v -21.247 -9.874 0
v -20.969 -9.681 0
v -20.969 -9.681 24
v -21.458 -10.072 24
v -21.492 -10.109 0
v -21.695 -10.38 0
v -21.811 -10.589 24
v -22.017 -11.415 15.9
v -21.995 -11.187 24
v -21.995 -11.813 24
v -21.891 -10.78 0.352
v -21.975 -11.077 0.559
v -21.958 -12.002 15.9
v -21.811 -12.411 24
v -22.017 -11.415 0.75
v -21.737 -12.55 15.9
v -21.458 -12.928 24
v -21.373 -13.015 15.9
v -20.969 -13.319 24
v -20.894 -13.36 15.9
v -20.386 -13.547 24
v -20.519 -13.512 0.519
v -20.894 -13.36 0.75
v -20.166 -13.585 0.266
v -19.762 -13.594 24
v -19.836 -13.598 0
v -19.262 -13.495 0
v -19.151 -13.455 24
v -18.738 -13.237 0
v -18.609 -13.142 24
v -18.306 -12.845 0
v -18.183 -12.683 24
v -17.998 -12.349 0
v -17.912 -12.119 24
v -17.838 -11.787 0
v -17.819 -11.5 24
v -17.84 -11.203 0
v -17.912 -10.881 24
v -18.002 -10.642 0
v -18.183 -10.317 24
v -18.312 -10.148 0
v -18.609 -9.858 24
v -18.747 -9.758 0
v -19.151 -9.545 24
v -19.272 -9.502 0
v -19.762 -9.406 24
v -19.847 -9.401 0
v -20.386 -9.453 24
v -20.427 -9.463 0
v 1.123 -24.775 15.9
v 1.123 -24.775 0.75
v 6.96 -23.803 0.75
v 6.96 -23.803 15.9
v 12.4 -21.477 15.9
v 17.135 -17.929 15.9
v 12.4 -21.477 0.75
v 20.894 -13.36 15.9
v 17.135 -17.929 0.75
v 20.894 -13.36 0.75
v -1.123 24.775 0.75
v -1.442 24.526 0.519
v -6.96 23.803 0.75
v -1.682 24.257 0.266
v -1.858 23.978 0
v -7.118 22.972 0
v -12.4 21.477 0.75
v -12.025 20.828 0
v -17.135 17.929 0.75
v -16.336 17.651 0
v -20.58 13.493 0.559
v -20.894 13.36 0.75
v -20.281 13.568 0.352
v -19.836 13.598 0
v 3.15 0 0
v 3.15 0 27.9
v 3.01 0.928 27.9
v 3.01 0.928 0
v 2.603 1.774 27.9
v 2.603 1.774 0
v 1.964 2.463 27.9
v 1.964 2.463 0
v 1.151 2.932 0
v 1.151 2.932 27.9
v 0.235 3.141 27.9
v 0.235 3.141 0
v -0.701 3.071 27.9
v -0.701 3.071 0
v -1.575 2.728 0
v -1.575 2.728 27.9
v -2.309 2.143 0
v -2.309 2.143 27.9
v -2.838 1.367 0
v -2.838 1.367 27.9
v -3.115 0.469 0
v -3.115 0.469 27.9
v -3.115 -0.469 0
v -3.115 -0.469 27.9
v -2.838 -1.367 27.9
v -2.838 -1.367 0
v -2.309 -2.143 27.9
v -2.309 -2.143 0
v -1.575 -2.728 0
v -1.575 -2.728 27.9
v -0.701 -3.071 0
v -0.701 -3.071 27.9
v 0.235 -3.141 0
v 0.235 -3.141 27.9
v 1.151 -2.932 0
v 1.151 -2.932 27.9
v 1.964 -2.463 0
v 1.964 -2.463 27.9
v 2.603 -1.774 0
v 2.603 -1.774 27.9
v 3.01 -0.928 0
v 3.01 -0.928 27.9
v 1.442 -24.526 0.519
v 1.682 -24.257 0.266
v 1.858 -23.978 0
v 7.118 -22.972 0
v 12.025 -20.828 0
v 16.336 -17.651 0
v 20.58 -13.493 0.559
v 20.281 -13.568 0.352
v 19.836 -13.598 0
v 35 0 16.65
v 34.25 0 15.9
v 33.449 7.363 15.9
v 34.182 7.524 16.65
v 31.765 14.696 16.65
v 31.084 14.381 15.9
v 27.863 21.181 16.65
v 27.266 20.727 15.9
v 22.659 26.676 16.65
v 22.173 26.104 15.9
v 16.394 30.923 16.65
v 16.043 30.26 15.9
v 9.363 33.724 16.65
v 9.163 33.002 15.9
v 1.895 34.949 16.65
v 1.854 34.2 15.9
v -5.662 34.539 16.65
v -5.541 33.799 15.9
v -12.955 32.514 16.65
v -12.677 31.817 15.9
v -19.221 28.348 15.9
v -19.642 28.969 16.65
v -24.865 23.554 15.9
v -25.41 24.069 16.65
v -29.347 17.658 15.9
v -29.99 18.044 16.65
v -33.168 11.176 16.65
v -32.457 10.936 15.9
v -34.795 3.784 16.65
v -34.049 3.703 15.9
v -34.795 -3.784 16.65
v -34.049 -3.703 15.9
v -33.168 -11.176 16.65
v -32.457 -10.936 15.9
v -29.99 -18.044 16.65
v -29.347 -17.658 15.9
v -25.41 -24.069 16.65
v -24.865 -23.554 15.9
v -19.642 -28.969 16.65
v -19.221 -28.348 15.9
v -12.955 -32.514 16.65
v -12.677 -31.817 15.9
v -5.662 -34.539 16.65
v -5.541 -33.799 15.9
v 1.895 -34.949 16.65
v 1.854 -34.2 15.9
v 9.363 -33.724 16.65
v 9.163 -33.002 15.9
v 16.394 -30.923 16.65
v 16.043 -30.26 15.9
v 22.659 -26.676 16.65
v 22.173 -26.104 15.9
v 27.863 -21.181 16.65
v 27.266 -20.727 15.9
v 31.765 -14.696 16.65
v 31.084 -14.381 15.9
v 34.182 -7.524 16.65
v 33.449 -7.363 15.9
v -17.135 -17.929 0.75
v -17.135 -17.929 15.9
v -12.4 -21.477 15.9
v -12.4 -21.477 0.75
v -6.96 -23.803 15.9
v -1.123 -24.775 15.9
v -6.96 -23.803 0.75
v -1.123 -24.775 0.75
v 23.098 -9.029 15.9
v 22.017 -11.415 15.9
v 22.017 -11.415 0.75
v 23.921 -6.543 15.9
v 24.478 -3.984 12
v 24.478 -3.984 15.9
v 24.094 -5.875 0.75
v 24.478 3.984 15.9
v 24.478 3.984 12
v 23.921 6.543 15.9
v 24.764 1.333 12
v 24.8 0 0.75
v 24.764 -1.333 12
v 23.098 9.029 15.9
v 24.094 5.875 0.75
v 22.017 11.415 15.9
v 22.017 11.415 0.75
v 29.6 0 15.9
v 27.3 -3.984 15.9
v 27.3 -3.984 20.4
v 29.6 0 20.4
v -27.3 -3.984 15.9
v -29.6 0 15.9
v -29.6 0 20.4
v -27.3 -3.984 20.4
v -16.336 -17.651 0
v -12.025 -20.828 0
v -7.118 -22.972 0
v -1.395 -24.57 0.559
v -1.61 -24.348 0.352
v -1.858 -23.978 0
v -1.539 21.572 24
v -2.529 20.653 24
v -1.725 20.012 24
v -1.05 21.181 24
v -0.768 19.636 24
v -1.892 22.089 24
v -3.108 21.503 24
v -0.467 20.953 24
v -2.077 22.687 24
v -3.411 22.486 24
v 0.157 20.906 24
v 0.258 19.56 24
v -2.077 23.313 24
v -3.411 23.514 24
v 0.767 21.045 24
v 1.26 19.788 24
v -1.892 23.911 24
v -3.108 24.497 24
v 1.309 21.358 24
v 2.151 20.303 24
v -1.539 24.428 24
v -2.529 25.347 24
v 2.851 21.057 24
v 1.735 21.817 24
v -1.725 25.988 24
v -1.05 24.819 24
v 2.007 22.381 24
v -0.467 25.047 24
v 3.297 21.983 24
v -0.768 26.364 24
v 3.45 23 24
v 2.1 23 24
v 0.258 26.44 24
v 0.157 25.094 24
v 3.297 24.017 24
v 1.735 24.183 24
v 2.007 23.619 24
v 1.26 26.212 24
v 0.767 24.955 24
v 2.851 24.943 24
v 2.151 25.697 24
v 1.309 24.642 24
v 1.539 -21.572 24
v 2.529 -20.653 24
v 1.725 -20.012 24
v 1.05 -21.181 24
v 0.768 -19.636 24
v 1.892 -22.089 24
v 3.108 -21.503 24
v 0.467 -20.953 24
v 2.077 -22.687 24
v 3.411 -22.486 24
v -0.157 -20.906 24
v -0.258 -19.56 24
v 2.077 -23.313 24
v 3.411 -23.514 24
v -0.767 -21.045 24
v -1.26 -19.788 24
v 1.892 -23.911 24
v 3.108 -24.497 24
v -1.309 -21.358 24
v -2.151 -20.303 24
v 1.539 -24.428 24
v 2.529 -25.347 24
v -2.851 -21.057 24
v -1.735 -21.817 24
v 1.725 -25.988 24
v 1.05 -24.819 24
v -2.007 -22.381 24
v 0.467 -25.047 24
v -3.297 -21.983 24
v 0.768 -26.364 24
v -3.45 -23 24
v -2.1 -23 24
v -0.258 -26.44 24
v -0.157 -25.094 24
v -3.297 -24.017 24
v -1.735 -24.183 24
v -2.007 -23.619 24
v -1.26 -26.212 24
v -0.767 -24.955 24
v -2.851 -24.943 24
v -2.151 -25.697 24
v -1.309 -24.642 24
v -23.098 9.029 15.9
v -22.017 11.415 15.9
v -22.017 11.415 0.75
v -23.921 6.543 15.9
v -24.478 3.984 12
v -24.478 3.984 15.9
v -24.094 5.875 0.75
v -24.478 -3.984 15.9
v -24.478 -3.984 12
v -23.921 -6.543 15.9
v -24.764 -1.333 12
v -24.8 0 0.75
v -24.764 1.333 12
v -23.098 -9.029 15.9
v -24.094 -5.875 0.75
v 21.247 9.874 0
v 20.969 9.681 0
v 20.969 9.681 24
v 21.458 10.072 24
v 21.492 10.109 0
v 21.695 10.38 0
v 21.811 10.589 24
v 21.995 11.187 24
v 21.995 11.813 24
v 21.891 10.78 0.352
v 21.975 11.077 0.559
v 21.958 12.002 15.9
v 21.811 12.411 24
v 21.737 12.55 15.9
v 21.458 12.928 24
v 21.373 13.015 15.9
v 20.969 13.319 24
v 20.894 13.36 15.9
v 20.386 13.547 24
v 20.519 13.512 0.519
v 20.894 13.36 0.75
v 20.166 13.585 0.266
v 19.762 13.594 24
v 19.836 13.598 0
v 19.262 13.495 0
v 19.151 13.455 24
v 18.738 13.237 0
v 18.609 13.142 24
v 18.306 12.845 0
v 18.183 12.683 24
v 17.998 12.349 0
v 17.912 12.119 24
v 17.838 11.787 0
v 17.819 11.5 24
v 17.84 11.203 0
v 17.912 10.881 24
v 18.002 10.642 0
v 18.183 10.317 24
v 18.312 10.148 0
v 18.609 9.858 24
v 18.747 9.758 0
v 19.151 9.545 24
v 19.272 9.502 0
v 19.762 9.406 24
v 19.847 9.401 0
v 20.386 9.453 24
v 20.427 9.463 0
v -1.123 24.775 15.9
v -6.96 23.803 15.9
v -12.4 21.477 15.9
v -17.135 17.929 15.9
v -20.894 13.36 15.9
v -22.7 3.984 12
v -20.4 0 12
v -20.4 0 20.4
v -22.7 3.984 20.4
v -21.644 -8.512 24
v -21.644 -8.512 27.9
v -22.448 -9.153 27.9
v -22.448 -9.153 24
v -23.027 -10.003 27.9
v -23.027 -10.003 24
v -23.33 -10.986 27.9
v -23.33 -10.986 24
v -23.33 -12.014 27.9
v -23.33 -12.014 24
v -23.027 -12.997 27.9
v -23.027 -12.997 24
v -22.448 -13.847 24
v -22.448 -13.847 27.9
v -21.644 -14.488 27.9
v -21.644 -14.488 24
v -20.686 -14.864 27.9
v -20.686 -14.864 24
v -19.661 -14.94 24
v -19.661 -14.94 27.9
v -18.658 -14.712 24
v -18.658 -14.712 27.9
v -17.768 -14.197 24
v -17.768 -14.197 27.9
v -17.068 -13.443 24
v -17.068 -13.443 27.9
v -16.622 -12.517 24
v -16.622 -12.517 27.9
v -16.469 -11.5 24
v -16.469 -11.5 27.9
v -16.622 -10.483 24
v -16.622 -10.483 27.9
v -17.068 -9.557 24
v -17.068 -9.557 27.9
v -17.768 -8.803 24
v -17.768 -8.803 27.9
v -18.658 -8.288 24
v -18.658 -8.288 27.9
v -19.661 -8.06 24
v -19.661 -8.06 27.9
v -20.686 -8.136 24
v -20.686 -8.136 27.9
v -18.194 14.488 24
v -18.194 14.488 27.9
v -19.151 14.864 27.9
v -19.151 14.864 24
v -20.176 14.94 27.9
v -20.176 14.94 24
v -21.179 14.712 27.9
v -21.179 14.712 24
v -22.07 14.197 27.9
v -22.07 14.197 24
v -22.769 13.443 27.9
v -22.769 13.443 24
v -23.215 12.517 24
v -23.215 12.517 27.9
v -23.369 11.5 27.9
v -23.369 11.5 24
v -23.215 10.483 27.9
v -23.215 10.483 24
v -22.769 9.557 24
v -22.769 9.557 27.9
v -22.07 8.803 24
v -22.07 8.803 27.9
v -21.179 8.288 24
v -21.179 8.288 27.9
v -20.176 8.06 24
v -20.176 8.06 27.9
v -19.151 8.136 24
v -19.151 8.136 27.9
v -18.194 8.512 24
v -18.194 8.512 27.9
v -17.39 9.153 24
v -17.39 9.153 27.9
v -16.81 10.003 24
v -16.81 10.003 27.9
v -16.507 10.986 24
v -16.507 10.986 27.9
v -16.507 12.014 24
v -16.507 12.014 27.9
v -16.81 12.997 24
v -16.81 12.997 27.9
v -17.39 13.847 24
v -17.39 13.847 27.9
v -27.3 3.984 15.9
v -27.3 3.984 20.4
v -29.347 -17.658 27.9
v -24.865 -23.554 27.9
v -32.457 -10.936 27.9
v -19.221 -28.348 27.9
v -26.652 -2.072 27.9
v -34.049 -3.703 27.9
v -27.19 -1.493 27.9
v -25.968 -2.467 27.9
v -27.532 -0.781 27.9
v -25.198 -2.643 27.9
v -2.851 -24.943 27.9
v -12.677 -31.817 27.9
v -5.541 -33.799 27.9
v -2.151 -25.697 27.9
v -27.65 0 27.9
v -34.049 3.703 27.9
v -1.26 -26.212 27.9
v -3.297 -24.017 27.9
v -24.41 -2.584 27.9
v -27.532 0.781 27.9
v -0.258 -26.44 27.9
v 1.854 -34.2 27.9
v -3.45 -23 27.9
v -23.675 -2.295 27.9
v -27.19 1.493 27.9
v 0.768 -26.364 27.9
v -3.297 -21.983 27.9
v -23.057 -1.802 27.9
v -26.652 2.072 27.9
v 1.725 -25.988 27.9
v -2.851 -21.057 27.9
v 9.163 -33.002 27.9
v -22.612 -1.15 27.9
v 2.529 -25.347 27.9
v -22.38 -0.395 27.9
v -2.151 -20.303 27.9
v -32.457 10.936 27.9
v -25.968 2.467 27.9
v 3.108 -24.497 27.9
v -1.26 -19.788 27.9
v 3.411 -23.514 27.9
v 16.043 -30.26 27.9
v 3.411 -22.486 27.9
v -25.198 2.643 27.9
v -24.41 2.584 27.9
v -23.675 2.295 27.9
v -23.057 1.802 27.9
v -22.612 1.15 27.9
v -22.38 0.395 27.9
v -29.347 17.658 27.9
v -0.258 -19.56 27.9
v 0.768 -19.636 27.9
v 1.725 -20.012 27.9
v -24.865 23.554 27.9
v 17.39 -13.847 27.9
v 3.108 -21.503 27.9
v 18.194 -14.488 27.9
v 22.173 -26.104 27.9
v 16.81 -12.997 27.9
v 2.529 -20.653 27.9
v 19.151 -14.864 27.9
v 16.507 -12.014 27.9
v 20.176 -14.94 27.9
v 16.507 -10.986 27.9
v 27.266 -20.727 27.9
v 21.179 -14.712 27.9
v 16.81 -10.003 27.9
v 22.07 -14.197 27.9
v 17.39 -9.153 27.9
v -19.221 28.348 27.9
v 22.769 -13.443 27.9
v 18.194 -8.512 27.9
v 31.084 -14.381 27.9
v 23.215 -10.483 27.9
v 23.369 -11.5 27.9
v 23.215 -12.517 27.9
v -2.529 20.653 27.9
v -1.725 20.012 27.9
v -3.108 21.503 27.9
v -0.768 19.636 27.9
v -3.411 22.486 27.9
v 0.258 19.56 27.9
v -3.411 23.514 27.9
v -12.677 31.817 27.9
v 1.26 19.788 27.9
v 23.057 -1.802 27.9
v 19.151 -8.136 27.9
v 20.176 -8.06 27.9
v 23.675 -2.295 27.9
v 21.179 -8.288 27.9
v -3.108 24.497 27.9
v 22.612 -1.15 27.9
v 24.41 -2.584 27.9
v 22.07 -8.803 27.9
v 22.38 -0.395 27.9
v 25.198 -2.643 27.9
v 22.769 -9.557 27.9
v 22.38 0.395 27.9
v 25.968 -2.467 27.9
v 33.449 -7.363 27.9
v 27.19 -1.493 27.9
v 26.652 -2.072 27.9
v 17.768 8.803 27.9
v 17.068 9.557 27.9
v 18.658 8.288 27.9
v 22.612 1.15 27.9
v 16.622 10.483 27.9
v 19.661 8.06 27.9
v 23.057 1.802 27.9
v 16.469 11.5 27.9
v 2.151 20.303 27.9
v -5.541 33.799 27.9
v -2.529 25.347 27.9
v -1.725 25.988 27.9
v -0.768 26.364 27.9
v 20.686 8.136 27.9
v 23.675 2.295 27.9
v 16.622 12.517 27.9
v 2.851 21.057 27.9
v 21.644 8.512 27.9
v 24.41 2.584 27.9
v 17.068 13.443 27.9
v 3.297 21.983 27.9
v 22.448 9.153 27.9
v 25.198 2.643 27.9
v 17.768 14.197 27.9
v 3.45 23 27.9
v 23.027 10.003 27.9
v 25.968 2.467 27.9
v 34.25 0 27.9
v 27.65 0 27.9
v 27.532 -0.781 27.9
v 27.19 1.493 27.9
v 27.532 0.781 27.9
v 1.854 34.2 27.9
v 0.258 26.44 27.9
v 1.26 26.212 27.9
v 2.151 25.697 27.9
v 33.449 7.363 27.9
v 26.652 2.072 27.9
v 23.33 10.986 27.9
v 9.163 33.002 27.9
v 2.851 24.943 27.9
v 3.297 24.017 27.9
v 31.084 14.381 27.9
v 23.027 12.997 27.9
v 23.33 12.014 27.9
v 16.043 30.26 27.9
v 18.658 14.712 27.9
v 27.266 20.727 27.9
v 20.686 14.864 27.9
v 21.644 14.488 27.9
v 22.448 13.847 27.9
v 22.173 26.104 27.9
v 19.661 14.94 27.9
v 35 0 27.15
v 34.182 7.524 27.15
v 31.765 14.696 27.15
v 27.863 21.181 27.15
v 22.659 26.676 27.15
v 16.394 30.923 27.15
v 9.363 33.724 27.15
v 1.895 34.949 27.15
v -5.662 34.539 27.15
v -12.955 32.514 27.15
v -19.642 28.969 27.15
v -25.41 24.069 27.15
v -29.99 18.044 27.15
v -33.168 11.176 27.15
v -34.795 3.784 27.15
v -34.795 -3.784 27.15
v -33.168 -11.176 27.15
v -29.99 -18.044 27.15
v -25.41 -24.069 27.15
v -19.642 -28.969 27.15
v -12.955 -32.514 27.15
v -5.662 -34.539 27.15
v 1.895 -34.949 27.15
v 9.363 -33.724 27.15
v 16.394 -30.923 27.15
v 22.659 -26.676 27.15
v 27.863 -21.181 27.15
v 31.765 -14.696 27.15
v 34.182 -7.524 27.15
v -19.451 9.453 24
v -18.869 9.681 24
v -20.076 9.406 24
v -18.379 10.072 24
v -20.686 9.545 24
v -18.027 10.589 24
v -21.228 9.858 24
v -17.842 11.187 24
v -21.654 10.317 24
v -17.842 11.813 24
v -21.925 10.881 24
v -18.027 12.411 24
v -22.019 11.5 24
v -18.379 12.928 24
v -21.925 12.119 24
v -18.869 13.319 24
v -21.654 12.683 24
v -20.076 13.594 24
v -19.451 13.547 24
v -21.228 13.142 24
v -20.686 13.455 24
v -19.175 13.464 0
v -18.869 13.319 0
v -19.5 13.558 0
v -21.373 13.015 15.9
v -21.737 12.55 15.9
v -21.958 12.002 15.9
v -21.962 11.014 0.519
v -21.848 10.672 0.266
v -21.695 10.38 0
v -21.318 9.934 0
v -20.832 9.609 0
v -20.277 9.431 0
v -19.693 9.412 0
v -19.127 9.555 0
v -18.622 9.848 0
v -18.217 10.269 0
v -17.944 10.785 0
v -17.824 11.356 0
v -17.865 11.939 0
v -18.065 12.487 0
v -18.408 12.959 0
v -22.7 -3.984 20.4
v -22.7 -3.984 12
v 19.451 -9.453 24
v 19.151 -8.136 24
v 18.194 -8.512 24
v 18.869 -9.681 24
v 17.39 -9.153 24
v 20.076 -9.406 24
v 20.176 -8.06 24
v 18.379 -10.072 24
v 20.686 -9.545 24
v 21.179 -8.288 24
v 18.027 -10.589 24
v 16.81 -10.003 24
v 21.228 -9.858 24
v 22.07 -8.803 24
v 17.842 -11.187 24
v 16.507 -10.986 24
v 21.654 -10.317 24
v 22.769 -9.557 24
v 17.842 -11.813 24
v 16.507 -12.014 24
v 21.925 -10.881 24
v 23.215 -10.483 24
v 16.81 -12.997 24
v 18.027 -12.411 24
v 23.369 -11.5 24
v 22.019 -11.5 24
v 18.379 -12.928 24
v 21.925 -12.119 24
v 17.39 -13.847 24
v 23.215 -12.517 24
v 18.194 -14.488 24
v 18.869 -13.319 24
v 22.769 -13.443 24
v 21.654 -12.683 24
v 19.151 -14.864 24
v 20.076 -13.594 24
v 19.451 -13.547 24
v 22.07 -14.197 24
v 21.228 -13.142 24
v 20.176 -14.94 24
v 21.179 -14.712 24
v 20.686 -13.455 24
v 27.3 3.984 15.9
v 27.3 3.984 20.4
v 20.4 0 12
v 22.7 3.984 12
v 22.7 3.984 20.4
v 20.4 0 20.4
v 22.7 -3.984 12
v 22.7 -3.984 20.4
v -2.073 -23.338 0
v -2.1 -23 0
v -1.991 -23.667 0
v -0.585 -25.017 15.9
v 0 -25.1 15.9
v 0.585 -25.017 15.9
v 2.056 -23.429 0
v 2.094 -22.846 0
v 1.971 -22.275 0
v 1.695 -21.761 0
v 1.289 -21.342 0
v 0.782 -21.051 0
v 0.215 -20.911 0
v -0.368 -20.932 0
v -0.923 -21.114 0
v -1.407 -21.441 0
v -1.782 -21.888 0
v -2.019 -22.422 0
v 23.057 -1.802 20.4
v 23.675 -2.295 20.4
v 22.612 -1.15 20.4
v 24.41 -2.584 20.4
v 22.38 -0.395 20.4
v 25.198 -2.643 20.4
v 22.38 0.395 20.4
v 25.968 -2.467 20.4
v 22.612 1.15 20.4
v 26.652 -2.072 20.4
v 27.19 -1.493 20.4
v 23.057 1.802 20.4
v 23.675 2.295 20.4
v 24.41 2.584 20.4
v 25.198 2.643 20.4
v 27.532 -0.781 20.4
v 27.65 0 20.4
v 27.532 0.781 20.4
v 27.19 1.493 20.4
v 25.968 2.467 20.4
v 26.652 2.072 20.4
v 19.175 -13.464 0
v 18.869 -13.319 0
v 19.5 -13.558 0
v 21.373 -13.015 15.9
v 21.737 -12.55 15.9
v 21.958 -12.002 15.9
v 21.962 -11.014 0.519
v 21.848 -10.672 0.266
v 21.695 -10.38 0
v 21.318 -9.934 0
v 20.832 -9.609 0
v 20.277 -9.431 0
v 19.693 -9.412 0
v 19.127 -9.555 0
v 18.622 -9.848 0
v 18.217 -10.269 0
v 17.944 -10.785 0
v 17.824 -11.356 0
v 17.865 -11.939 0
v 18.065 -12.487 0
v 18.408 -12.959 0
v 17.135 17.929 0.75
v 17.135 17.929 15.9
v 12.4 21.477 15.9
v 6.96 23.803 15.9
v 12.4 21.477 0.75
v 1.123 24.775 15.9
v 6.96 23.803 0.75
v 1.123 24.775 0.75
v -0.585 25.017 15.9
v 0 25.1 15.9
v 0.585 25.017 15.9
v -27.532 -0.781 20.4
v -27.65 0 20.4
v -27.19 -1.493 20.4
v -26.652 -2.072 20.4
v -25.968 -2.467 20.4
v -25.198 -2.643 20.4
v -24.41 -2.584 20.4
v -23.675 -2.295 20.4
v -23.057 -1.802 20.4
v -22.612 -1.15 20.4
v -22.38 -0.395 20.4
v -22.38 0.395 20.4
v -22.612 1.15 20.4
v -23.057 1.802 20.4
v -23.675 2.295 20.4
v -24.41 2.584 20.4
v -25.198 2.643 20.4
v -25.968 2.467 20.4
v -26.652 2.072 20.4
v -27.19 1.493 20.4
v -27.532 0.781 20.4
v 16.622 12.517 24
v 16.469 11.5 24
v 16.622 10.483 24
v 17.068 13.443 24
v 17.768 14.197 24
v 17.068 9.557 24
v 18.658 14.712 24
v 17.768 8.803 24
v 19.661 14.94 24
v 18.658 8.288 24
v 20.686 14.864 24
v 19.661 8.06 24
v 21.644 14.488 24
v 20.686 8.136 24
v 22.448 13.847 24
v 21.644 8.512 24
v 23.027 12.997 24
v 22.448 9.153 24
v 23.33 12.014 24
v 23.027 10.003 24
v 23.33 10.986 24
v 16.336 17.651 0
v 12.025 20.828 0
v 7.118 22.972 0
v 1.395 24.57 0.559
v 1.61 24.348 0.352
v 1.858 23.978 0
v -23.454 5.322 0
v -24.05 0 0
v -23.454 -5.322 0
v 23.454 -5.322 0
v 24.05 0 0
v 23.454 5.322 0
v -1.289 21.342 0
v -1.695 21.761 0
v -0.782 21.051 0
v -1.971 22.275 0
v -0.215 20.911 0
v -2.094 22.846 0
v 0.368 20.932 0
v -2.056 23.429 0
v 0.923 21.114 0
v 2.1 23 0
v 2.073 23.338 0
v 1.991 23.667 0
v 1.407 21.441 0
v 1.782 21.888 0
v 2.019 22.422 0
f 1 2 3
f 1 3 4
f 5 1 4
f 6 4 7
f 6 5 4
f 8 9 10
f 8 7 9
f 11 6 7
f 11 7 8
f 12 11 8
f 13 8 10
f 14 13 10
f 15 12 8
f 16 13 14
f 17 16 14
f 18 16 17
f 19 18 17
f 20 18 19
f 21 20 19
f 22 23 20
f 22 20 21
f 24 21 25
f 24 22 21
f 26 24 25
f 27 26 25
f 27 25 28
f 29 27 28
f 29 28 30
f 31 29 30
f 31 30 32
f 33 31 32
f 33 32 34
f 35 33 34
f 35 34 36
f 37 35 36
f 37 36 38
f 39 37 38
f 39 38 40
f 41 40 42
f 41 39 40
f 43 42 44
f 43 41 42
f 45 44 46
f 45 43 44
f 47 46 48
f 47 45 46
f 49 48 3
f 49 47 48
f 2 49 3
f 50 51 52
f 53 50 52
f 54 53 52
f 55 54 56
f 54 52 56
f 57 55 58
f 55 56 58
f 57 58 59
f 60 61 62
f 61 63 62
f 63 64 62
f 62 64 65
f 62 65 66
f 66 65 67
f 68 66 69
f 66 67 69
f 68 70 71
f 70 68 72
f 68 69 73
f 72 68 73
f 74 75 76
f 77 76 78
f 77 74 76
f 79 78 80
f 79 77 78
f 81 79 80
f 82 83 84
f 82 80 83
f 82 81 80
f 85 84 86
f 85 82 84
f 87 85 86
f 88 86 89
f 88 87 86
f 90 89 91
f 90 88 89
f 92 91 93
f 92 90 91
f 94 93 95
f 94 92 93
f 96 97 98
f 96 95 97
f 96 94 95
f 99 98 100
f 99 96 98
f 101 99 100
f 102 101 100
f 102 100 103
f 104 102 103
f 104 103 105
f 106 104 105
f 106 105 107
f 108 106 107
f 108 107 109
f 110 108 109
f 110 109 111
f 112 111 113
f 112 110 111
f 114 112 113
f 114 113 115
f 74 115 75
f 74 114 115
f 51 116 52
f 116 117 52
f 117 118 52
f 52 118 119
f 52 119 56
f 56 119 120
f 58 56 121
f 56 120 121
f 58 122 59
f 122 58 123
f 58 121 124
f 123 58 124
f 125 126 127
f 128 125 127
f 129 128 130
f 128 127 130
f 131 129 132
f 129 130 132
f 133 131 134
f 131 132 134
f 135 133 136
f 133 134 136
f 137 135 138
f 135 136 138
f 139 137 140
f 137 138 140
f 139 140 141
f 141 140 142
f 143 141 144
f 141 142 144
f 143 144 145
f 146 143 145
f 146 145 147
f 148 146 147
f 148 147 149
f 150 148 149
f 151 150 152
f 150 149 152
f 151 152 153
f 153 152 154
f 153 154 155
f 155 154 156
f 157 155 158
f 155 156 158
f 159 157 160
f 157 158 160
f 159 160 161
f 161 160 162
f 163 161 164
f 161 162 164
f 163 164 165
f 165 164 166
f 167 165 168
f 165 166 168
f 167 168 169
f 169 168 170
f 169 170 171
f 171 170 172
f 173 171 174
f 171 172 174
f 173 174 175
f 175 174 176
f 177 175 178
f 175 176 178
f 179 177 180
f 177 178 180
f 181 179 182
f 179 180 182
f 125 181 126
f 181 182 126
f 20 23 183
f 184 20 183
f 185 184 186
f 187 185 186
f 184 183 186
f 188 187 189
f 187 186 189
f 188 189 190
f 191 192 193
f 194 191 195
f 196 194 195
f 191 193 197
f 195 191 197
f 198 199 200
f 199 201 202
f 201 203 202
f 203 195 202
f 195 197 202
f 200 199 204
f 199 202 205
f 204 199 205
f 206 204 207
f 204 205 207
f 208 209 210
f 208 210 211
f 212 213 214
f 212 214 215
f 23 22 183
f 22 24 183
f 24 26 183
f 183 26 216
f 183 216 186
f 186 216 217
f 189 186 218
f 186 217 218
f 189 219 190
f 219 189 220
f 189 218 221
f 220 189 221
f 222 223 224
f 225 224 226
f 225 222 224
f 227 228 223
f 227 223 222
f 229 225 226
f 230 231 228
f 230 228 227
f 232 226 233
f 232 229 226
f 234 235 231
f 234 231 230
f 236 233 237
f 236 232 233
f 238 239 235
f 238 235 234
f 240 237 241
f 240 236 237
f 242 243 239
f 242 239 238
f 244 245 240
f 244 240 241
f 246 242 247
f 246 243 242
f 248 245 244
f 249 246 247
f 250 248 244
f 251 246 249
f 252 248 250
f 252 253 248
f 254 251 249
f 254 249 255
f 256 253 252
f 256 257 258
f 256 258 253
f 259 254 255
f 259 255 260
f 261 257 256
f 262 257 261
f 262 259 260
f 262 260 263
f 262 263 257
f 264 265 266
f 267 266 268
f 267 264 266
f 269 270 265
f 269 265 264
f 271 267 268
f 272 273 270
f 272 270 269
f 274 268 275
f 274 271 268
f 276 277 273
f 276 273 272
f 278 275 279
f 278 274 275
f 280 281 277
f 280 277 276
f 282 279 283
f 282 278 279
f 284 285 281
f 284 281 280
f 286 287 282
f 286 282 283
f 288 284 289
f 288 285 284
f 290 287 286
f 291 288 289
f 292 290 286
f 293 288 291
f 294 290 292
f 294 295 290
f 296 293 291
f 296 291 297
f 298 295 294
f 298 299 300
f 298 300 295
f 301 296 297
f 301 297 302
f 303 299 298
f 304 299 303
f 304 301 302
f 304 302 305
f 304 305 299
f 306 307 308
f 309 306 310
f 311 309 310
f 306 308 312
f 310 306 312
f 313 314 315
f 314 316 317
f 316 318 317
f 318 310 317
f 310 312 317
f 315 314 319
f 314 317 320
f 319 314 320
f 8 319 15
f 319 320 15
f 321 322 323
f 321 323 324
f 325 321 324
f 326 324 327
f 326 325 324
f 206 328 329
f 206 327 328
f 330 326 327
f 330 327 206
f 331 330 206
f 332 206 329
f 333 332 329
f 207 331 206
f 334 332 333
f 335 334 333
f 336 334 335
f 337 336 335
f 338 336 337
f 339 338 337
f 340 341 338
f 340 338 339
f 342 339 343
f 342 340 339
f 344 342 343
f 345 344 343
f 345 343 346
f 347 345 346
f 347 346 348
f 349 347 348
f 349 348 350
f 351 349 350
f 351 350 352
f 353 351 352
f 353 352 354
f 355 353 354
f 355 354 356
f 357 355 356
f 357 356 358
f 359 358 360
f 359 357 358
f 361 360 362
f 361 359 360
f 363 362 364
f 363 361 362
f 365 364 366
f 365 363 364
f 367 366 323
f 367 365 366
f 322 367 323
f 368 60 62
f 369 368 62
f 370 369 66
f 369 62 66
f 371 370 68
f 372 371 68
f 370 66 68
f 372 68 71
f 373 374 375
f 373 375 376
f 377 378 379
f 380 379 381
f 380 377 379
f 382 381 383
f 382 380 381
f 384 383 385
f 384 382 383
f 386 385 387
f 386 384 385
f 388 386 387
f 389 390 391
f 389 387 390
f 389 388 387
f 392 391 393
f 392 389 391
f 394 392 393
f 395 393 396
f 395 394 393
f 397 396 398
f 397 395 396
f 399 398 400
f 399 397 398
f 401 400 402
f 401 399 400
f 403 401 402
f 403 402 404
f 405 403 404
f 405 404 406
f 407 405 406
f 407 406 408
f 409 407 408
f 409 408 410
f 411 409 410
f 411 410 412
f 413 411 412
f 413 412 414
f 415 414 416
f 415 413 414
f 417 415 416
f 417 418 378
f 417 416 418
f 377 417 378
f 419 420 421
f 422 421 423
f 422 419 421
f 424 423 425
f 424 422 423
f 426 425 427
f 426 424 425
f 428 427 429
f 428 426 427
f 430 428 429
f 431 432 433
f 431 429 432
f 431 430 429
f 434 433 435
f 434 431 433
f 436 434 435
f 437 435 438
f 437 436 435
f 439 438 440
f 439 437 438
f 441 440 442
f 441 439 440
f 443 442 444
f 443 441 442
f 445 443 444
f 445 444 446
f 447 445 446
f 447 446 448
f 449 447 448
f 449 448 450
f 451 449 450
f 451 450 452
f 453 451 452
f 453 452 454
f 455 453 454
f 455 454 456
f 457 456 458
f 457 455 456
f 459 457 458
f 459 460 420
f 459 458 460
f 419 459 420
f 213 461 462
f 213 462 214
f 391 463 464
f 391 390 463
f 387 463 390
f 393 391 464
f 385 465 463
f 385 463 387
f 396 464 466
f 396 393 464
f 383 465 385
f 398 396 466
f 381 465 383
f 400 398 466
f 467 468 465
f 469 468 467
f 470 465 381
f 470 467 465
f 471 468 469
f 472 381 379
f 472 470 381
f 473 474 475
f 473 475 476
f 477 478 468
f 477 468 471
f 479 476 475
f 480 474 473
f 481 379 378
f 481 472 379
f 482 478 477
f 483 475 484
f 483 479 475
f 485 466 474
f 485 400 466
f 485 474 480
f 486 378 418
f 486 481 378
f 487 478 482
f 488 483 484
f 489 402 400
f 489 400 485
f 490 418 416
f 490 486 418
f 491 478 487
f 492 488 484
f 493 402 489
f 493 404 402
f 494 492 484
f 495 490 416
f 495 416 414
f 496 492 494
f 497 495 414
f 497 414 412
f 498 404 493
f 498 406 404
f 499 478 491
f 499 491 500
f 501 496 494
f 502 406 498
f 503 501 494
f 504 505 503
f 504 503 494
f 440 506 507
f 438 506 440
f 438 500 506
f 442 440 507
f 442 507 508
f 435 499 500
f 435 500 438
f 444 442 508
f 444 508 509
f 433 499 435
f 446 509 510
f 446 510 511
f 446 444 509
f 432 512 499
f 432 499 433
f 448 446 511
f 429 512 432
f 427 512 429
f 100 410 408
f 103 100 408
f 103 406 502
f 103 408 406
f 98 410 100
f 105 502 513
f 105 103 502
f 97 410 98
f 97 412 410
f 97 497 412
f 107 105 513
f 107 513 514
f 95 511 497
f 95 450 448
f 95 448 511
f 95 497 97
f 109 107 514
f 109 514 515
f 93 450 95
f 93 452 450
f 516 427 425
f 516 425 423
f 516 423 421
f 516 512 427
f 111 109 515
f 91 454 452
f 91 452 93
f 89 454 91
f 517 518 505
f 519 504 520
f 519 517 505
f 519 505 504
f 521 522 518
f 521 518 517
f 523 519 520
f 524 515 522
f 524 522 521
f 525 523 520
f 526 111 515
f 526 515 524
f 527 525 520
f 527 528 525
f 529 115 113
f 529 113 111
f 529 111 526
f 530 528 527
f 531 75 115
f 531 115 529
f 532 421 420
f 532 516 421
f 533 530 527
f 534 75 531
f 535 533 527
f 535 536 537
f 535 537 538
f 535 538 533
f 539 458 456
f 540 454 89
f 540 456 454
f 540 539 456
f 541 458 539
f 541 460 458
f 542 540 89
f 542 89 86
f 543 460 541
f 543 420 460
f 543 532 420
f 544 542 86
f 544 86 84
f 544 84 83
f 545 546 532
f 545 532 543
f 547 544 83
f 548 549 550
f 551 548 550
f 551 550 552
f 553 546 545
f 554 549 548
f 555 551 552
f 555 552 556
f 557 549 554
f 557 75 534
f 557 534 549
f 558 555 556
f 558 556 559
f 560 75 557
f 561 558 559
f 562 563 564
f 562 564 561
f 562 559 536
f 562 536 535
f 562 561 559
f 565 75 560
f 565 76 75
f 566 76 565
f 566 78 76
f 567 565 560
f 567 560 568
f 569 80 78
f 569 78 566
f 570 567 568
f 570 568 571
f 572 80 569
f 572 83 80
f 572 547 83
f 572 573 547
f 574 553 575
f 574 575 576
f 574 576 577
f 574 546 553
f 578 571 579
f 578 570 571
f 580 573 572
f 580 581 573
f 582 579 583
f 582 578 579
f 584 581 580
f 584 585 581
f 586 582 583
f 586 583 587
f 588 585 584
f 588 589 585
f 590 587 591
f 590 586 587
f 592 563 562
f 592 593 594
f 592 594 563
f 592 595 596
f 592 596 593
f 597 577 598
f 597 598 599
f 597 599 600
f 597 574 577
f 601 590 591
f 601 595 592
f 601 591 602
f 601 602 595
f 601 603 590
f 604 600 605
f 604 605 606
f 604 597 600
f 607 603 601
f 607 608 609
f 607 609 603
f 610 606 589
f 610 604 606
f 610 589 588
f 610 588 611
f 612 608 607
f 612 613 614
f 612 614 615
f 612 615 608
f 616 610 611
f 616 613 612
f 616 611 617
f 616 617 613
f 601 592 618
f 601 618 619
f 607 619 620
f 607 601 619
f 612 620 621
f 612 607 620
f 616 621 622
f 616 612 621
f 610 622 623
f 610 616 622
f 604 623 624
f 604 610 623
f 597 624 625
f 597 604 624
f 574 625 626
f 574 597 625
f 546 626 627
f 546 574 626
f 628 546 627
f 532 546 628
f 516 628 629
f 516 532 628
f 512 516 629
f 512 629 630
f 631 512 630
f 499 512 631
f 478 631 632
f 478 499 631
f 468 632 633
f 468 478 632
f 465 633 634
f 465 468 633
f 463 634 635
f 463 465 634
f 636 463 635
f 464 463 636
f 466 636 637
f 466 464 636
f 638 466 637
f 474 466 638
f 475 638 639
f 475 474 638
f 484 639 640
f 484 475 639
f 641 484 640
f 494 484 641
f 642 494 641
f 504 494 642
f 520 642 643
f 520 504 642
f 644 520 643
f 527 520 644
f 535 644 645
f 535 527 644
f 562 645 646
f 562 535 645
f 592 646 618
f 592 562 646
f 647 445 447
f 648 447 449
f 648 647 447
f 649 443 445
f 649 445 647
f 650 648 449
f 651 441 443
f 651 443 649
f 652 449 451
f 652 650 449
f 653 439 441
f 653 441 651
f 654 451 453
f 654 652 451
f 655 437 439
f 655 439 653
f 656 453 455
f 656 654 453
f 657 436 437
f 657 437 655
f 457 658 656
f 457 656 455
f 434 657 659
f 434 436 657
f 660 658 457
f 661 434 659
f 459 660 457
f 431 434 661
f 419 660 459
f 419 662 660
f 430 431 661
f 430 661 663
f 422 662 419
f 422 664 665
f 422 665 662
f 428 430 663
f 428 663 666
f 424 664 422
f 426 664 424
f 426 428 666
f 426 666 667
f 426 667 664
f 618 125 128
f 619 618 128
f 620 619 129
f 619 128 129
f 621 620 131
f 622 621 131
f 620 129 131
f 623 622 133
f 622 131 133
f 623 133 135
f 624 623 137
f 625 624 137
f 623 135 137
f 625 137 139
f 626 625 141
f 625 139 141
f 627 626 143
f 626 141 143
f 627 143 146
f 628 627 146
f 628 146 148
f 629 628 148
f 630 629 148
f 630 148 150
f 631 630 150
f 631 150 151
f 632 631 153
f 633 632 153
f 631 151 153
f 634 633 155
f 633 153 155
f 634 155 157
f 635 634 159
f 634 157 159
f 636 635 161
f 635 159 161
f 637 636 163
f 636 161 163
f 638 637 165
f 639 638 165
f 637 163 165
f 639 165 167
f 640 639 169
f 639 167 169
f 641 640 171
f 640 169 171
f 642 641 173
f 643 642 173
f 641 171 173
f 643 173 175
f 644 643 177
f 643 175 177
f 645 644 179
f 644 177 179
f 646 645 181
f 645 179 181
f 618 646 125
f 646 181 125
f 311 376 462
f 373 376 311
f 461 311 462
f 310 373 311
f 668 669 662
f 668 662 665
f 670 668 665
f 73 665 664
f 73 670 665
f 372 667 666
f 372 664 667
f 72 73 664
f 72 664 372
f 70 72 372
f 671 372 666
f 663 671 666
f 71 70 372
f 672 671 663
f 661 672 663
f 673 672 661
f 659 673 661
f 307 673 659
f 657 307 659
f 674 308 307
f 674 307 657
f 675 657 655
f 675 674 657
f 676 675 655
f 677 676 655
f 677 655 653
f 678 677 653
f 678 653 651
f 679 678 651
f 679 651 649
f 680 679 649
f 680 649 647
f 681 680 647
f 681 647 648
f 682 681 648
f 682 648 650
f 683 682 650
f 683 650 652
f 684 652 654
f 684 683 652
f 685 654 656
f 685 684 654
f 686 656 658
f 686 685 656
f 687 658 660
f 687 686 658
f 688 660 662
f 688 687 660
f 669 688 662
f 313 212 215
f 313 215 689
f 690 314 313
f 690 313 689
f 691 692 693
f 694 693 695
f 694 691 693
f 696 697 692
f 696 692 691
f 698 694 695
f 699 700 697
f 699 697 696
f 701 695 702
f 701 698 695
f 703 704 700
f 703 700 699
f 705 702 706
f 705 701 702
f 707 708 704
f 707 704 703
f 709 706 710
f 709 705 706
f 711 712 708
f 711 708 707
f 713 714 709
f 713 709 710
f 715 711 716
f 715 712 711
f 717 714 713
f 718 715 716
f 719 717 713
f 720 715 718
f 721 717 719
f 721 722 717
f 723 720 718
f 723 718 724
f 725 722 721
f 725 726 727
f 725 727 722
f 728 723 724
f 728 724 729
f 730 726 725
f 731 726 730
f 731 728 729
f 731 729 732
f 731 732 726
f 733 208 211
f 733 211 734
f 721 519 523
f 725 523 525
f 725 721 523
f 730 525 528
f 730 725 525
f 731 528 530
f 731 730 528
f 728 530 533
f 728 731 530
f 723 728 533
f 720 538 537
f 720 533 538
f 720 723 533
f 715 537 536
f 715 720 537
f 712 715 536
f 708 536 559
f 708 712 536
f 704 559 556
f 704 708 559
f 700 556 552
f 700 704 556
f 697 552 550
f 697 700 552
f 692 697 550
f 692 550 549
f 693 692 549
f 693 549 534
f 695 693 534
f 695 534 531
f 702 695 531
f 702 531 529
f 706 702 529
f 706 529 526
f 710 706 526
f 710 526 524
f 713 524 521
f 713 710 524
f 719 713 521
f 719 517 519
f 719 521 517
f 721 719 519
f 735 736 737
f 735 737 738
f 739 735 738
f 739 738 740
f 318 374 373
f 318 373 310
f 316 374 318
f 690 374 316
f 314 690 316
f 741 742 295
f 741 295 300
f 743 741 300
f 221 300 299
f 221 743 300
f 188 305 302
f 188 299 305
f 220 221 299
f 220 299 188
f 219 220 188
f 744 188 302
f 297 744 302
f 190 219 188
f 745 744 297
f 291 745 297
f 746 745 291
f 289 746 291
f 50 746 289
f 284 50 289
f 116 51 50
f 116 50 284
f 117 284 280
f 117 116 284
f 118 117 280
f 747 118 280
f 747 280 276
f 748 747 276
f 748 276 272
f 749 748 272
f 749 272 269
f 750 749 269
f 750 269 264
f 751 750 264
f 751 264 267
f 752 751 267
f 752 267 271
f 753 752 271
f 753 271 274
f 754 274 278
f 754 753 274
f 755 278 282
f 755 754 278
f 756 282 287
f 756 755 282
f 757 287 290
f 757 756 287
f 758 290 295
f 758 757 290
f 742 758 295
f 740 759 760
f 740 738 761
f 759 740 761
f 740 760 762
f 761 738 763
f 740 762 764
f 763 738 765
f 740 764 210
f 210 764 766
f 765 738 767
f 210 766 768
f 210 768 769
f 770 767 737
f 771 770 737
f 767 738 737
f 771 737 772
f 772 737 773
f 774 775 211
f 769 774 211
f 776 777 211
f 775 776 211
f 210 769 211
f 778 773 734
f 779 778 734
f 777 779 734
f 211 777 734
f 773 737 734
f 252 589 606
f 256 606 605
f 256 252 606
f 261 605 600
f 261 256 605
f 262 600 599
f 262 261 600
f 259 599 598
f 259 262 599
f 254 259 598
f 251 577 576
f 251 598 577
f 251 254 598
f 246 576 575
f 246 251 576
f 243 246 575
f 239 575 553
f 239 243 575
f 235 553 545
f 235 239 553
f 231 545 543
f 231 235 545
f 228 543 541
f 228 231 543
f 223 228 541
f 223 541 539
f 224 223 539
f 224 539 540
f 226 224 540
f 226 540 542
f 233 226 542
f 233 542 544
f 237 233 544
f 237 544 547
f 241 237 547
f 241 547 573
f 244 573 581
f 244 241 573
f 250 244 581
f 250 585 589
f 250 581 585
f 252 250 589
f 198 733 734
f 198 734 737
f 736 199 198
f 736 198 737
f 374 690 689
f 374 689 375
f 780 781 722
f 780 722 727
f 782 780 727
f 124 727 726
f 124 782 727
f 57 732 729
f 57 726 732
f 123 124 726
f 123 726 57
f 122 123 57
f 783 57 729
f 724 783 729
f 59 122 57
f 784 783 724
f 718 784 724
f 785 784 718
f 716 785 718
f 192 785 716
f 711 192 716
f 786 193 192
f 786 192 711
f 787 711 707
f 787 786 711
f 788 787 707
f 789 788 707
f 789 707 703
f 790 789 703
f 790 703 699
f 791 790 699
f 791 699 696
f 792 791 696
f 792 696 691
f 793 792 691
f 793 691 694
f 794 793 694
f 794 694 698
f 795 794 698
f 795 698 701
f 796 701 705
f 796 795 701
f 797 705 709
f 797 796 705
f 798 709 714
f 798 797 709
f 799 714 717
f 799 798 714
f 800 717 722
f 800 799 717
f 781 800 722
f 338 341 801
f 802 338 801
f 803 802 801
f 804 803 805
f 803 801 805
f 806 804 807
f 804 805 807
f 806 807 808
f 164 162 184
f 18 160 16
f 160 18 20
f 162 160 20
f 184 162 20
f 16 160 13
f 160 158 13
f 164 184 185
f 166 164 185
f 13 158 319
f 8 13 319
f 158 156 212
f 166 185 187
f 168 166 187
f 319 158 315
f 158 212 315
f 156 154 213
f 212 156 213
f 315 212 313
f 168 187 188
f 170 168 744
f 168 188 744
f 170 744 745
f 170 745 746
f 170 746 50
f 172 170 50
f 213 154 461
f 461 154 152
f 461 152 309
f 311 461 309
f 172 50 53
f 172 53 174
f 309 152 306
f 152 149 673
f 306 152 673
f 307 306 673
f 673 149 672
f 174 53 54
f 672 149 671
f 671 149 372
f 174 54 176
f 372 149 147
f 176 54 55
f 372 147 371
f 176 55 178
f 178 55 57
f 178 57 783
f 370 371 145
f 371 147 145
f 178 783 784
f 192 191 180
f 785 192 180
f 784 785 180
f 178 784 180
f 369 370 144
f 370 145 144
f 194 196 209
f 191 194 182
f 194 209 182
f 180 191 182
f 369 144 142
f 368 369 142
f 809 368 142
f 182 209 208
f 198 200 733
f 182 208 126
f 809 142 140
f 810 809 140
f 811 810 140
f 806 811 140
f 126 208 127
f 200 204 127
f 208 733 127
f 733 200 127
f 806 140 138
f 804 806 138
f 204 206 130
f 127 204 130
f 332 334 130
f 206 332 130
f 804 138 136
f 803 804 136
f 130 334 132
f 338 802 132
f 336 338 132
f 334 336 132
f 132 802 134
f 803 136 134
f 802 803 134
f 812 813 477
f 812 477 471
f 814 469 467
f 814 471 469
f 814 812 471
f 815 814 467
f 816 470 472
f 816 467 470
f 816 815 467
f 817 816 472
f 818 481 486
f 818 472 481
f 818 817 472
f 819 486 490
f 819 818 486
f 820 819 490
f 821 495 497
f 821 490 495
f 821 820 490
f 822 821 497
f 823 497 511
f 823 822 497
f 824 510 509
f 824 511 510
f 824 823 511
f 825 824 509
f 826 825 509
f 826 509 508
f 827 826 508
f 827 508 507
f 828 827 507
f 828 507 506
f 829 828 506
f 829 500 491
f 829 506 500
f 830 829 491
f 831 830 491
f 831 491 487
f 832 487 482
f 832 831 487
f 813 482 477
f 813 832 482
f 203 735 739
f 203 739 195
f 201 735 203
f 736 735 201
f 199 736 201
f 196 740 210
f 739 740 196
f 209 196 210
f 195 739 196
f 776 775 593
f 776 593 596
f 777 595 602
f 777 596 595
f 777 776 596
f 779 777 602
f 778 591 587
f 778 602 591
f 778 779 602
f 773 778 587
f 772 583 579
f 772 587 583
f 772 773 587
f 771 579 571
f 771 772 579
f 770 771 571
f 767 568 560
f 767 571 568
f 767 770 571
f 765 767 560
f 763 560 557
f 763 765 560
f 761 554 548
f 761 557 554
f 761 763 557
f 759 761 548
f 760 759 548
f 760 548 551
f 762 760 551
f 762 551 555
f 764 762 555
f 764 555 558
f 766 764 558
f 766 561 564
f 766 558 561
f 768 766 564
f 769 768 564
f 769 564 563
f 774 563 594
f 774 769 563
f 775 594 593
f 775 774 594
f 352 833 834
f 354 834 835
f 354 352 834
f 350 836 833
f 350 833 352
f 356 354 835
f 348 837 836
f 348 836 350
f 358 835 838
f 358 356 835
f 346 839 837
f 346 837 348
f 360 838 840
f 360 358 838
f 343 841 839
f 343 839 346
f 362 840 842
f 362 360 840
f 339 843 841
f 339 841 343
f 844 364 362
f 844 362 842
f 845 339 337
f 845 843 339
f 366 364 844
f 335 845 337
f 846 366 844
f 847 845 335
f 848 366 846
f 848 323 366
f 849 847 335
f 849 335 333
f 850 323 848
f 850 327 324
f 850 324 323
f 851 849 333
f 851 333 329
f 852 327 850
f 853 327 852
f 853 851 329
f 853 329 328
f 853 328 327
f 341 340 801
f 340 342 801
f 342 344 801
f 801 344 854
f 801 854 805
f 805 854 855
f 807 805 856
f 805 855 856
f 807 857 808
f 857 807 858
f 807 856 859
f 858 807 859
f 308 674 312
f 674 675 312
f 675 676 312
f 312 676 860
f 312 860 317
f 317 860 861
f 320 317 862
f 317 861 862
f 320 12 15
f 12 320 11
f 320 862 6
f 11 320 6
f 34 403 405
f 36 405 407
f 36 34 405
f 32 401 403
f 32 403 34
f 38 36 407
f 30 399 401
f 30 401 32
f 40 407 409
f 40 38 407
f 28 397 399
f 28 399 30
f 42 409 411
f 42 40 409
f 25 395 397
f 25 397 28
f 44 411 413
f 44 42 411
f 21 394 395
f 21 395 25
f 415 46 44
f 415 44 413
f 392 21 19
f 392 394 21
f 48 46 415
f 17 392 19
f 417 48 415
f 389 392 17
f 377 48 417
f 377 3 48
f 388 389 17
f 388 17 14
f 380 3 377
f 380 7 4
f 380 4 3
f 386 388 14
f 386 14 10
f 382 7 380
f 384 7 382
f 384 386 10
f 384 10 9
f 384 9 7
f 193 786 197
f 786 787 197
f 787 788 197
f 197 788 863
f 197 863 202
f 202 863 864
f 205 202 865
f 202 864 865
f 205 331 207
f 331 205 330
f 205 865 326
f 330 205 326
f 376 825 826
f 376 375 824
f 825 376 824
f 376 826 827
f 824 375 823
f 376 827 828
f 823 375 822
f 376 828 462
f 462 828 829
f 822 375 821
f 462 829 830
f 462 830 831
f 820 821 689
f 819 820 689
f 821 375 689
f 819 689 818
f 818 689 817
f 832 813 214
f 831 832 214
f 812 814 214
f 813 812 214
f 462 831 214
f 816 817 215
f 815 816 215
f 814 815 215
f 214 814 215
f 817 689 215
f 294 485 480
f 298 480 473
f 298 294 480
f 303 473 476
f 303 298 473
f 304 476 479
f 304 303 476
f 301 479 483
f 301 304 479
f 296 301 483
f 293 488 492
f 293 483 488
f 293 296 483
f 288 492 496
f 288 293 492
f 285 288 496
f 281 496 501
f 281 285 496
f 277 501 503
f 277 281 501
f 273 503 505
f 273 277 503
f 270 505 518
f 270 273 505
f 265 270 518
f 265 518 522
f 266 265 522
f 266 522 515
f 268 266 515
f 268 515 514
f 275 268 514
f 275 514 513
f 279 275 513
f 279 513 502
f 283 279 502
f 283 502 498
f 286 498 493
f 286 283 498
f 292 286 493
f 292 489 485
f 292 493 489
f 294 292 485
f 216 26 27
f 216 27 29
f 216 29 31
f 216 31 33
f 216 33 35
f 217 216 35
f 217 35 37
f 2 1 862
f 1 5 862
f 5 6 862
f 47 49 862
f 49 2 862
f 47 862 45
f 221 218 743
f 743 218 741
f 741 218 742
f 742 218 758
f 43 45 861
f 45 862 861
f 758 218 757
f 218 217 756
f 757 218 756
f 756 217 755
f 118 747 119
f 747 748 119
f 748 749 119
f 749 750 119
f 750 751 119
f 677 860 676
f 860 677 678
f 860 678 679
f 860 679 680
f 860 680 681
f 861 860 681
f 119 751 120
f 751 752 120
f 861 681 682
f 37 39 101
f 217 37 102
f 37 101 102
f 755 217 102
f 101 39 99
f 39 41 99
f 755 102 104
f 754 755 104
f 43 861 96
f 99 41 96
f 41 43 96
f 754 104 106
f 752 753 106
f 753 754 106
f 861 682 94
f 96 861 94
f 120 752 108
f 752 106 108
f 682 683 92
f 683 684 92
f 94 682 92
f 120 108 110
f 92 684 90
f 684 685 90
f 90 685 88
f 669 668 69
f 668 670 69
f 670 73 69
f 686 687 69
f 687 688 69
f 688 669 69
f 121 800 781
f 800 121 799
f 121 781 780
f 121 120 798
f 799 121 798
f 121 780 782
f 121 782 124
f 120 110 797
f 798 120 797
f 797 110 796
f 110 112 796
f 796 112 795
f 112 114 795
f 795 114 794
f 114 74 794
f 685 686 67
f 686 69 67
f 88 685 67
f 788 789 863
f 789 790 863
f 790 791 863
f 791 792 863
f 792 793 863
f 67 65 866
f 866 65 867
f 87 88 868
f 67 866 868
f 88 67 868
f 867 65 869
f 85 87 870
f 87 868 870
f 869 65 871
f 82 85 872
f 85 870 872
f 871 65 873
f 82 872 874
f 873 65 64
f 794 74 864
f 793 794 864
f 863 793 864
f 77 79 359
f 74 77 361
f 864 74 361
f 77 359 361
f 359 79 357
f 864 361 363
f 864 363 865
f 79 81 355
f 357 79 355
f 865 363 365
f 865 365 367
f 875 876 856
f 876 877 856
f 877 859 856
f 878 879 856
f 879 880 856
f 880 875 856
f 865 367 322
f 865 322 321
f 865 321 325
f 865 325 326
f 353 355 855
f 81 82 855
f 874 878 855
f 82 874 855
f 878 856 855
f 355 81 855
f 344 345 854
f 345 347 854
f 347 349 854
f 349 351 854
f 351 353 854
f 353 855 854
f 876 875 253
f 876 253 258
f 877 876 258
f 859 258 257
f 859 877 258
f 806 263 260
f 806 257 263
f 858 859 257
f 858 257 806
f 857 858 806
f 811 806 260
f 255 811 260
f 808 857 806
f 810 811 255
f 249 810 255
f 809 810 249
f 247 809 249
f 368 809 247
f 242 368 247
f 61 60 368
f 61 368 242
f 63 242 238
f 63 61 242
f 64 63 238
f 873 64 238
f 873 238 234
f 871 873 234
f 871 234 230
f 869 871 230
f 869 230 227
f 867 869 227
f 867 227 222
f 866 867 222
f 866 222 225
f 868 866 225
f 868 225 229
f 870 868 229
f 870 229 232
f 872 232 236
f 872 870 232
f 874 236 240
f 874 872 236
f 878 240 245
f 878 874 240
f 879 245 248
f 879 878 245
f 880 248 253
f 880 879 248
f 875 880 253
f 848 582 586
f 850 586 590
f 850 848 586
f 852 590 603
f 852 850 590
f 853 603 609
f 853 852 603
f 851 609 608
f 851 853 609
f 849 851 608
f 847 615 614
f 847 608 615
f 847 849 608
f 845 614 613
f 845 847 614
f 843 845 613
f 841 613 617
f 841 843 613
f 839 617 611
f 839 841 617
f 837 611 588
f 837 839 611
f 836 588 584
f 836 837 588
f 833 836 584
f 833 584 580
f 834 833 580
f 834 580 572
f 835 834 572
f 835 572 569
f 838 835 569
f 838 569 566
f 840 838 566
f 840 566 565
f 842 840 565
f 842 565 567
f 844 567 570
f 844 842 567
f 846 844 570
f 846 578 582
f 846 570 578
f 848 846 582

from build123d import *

# Parameters (mm, degrees)
CYLINDER014005867_R                      = 3.45
CYLINDER014005867_DEPTH                  = 4.1
CYLINDER014005866_R                      = 2.1
CYLINDER014005866_DEPTH                  = 28
FUSION001089102007_PLACEMENT_ANGLE       = 120
FUSION001089102007002_PLACEMENT_ANGLE    = 120
FUSION001089102007003_PLACEMENT_ANGLE    = 180
FUSION001089102007004_PLACEMENT_ANGLE    = 240
FUSION001089102007005_PLACEMENT_ANGLE    = 60
CYLINDER014005868_R                      = 3.15
CYLINDER014005868_DEPTH                  = 28
PRISM002_DEPTH                           = 8.4
CYLINDER014005869_R                      = 2.65
CYLINDER014005869_DEPTH                  = 28
FUSION001089102007007001_PLACEMENT_ANGLE = 180
FUSION001089102007001_PLACEMENT_ANGLE    = 60
CYLINDER014005865_R                      = 35
CYLINDER014005865_DEPTH                  = 12
CYLINDER014005859_R                      = 24.8
CYLINDER014005859_DEPTH                  = 15.9
CHAMFER011_SIZE                          = 0.75


with BuildPart() as v_lec777:
    # Cylinder014005867 → Cylinder014005867 (new body)
    with BuildSketch(Plane(origin=(0, 23, 24), x_dir=(1, 0, 0), z_dir=(0, 0, 1))):
        Circle(CYLINDER014005867_R)
    extrude(amount=CYLINDER014005867_DEPTH)


with BuildPart() as m4inbus:
    # Cylinder014005866 → Cylinder014005866 (new body)
    with BuildSketch(Plane(origin=(0, 23, 0), x_dir=(1, 0, 0), z_dir=(0, 0, 1))):
        Circle(CYLINDER014005866_R)
    extrude(amount=CYLINDER014005866_DEPTH)

    # Fusion001089102007: union Válec777
    add(v_lec777.part)


with BuildPart() as m4inbus_1:
    # Fusion001089102007 placement: moved
    add(m4inbus.part.rotate(Axis((0, 0, 0), (0, 0, 1)), FUSION001089102007_PLACEMENT_ANGLE))


with BuildPart() as m4inbus002:
    # Fusion001089102007002 base: copy of M4Inbus
    add(m4inbus_1.part)


with BuildPart() as m4inbus002_1:
    # Fusion001089102007002 placement: moved
    add(m4inbus002.part.rotate(Axis((0, 0, 0), (0, 0, 1)), FUSION001089102007002_PLACEMENT_ANGLE))


with BuildPart() as m4inbus003:
    # Fusion001089102007003 base: copy of M4Inbus
    add(m4inbus_1.part)


with BuildPart() as m4inbus003_1:
    # Fusion001089102007003 placement: moved
    add(m4inbus003.part.rotate(Axis((0, 0, 0), (0, 0, 1)), FUSION001089102007003_PLACEMENT_ANGLE))


with BuildPart() as m4inbus004:
    # Fusion001089102007004 base: copy of M4Inbus
    add(m4inbus_1.part)


with BuildPart() as m4inbus004_1:
    # Fusion001089102007004 placement: moved
    add(m4inbus004.part.rotate(Axis((0, 0, 0), (0, 0, 1)), FUSION001089102007004_PLACEMENT_ANGLE))


with BuildPart() as m4inbus005:
    # Fusion001089102007005 base: copy of M4Inbus
    add(m4inbus_1.part)


with BuildPart() as m4inbus005_1:
    # Fusion001089102007005 placement: moved
    add(m4inbus005.part.rotate(Axis((0, 0, 0), (0, 0, -1)), FUSION001089102007005_PLACEMENT_ANGLE))


with BuildPart() as v_lec778:
    # Cylinder014005868 → Cylinder014005868 (new body)
    with BuildSketch(Plane.XY):
        Circle(CYLINDER014005868_R)
    extrude(amount=CYLINDER014005868_DEPTH)


with BuildPart() as m4x002:
    # prism002 → prism002 (new body)
    with BuildSketch(Plane(origin=(25, 0, 12), x_dir=(1, 0, 0), z_dir=(0, 0, 1))):
        Polygon((4.6, 0), (2.3, 3.983717), (-2.3, 3.983717), (-4.6, 0), (-2.3, -3.983717), (2.3, -3.983717), align=None)
    extrude(amount=PRISM002_DEPTH)


with BuildPart() as fusion001089102007007:
    # Cylinder014005869 → Cylinder014005869 (new body)
    with BuildSketch(Plane(origin=(25, 0, 12), x_dir=(1, 0, 0), z_dir=(0, 0, 1))):
        Circle(CYLINDER014005869_R)
    extrude(amount=CYLINDER014005869_DEPTH)

    # Fusion001089102007007: union M4X002
    add(m4x002.part)


with BuildPart() as fusion001089102007007001:
    # Fusion001089102007007001 base: copy of Fusion001089102007007
    add(fusion001089102007007.part)


with BuildPart() as fusion001089102007007001_1:
    # Fusion001089102007007001 placement: moved
    add(fusion001089102007007001.part.rotate(Axis((0, 0, 0), (0, 0, 1)), FUSION001089102007007001_PLACEMENT_ANGLE))


with BuildPart() as fusion001089102007006:
    # Fusion001089102007001 base: copy of M4Inbus
    add(m4inbus_1.part)


with BuildPart() as fusion001089102007006_1:
    # Fusion001089102007001 placement: moved
    add(fusion001089102007006.part.rotate(Axis((0, 0, 0), (0, 0, 1)), FUSION001089102007001_PLACEMENT_ANGLE))

    # Fusion001089102007006: union M4Inbus002, M4Inbus003, M4Inbus004, M4Inbus005, Válec778, M4Inbus, Fusion001089102007007, Fusion001089102007007001
    add(m4inbus002_1.part)
    add(m4inbus003_1.part)
    add(m4inbus004_1.part)
    add(m4inbus005_1.part)
    add(v_lec778.part)
    add(m4inbus_1.part)
    add(fusion001089102007007.part)
    add(fusion001089102007007001_1.part)


with BuildPart() as h005:
    # Cylinder014005865 → Cylinder014005865 (new body)
    with BuildSketch(Plane.XY.offset(15.9)):
        Circle(CYLINDER014005865_R)
    extrude(amount=CYLINDER014005865_DEPTH)


with BuildPart() as outb:
    # Cylinder014005859 → Cylinder014005859 (new body)
    with BuildSketch(Plane.XY):
        Circle(CYLINDER014005859_R)
    extrude(amount=CYLINDER014005859_DEPTH)

    # Fusion001089102008: union H005
    add(h005.part)

    # Chamfer011
    chamfer011_edges = [outb.edges().sort_by_distance(p)[0] for p in [
        (-35, 0, 27.9),
        (-35, 0, 15.9),
        (-24.8, 0, 0),
    ]]
    chamfer(chamfer011_edges, length=CHAMFER011_SIZE)

    # Cut009003003009002: cut Fusion001089102007006
    add(fusion001089102007006_1.part, mode=Mode.SUBTRACT)


solid = outb.part
